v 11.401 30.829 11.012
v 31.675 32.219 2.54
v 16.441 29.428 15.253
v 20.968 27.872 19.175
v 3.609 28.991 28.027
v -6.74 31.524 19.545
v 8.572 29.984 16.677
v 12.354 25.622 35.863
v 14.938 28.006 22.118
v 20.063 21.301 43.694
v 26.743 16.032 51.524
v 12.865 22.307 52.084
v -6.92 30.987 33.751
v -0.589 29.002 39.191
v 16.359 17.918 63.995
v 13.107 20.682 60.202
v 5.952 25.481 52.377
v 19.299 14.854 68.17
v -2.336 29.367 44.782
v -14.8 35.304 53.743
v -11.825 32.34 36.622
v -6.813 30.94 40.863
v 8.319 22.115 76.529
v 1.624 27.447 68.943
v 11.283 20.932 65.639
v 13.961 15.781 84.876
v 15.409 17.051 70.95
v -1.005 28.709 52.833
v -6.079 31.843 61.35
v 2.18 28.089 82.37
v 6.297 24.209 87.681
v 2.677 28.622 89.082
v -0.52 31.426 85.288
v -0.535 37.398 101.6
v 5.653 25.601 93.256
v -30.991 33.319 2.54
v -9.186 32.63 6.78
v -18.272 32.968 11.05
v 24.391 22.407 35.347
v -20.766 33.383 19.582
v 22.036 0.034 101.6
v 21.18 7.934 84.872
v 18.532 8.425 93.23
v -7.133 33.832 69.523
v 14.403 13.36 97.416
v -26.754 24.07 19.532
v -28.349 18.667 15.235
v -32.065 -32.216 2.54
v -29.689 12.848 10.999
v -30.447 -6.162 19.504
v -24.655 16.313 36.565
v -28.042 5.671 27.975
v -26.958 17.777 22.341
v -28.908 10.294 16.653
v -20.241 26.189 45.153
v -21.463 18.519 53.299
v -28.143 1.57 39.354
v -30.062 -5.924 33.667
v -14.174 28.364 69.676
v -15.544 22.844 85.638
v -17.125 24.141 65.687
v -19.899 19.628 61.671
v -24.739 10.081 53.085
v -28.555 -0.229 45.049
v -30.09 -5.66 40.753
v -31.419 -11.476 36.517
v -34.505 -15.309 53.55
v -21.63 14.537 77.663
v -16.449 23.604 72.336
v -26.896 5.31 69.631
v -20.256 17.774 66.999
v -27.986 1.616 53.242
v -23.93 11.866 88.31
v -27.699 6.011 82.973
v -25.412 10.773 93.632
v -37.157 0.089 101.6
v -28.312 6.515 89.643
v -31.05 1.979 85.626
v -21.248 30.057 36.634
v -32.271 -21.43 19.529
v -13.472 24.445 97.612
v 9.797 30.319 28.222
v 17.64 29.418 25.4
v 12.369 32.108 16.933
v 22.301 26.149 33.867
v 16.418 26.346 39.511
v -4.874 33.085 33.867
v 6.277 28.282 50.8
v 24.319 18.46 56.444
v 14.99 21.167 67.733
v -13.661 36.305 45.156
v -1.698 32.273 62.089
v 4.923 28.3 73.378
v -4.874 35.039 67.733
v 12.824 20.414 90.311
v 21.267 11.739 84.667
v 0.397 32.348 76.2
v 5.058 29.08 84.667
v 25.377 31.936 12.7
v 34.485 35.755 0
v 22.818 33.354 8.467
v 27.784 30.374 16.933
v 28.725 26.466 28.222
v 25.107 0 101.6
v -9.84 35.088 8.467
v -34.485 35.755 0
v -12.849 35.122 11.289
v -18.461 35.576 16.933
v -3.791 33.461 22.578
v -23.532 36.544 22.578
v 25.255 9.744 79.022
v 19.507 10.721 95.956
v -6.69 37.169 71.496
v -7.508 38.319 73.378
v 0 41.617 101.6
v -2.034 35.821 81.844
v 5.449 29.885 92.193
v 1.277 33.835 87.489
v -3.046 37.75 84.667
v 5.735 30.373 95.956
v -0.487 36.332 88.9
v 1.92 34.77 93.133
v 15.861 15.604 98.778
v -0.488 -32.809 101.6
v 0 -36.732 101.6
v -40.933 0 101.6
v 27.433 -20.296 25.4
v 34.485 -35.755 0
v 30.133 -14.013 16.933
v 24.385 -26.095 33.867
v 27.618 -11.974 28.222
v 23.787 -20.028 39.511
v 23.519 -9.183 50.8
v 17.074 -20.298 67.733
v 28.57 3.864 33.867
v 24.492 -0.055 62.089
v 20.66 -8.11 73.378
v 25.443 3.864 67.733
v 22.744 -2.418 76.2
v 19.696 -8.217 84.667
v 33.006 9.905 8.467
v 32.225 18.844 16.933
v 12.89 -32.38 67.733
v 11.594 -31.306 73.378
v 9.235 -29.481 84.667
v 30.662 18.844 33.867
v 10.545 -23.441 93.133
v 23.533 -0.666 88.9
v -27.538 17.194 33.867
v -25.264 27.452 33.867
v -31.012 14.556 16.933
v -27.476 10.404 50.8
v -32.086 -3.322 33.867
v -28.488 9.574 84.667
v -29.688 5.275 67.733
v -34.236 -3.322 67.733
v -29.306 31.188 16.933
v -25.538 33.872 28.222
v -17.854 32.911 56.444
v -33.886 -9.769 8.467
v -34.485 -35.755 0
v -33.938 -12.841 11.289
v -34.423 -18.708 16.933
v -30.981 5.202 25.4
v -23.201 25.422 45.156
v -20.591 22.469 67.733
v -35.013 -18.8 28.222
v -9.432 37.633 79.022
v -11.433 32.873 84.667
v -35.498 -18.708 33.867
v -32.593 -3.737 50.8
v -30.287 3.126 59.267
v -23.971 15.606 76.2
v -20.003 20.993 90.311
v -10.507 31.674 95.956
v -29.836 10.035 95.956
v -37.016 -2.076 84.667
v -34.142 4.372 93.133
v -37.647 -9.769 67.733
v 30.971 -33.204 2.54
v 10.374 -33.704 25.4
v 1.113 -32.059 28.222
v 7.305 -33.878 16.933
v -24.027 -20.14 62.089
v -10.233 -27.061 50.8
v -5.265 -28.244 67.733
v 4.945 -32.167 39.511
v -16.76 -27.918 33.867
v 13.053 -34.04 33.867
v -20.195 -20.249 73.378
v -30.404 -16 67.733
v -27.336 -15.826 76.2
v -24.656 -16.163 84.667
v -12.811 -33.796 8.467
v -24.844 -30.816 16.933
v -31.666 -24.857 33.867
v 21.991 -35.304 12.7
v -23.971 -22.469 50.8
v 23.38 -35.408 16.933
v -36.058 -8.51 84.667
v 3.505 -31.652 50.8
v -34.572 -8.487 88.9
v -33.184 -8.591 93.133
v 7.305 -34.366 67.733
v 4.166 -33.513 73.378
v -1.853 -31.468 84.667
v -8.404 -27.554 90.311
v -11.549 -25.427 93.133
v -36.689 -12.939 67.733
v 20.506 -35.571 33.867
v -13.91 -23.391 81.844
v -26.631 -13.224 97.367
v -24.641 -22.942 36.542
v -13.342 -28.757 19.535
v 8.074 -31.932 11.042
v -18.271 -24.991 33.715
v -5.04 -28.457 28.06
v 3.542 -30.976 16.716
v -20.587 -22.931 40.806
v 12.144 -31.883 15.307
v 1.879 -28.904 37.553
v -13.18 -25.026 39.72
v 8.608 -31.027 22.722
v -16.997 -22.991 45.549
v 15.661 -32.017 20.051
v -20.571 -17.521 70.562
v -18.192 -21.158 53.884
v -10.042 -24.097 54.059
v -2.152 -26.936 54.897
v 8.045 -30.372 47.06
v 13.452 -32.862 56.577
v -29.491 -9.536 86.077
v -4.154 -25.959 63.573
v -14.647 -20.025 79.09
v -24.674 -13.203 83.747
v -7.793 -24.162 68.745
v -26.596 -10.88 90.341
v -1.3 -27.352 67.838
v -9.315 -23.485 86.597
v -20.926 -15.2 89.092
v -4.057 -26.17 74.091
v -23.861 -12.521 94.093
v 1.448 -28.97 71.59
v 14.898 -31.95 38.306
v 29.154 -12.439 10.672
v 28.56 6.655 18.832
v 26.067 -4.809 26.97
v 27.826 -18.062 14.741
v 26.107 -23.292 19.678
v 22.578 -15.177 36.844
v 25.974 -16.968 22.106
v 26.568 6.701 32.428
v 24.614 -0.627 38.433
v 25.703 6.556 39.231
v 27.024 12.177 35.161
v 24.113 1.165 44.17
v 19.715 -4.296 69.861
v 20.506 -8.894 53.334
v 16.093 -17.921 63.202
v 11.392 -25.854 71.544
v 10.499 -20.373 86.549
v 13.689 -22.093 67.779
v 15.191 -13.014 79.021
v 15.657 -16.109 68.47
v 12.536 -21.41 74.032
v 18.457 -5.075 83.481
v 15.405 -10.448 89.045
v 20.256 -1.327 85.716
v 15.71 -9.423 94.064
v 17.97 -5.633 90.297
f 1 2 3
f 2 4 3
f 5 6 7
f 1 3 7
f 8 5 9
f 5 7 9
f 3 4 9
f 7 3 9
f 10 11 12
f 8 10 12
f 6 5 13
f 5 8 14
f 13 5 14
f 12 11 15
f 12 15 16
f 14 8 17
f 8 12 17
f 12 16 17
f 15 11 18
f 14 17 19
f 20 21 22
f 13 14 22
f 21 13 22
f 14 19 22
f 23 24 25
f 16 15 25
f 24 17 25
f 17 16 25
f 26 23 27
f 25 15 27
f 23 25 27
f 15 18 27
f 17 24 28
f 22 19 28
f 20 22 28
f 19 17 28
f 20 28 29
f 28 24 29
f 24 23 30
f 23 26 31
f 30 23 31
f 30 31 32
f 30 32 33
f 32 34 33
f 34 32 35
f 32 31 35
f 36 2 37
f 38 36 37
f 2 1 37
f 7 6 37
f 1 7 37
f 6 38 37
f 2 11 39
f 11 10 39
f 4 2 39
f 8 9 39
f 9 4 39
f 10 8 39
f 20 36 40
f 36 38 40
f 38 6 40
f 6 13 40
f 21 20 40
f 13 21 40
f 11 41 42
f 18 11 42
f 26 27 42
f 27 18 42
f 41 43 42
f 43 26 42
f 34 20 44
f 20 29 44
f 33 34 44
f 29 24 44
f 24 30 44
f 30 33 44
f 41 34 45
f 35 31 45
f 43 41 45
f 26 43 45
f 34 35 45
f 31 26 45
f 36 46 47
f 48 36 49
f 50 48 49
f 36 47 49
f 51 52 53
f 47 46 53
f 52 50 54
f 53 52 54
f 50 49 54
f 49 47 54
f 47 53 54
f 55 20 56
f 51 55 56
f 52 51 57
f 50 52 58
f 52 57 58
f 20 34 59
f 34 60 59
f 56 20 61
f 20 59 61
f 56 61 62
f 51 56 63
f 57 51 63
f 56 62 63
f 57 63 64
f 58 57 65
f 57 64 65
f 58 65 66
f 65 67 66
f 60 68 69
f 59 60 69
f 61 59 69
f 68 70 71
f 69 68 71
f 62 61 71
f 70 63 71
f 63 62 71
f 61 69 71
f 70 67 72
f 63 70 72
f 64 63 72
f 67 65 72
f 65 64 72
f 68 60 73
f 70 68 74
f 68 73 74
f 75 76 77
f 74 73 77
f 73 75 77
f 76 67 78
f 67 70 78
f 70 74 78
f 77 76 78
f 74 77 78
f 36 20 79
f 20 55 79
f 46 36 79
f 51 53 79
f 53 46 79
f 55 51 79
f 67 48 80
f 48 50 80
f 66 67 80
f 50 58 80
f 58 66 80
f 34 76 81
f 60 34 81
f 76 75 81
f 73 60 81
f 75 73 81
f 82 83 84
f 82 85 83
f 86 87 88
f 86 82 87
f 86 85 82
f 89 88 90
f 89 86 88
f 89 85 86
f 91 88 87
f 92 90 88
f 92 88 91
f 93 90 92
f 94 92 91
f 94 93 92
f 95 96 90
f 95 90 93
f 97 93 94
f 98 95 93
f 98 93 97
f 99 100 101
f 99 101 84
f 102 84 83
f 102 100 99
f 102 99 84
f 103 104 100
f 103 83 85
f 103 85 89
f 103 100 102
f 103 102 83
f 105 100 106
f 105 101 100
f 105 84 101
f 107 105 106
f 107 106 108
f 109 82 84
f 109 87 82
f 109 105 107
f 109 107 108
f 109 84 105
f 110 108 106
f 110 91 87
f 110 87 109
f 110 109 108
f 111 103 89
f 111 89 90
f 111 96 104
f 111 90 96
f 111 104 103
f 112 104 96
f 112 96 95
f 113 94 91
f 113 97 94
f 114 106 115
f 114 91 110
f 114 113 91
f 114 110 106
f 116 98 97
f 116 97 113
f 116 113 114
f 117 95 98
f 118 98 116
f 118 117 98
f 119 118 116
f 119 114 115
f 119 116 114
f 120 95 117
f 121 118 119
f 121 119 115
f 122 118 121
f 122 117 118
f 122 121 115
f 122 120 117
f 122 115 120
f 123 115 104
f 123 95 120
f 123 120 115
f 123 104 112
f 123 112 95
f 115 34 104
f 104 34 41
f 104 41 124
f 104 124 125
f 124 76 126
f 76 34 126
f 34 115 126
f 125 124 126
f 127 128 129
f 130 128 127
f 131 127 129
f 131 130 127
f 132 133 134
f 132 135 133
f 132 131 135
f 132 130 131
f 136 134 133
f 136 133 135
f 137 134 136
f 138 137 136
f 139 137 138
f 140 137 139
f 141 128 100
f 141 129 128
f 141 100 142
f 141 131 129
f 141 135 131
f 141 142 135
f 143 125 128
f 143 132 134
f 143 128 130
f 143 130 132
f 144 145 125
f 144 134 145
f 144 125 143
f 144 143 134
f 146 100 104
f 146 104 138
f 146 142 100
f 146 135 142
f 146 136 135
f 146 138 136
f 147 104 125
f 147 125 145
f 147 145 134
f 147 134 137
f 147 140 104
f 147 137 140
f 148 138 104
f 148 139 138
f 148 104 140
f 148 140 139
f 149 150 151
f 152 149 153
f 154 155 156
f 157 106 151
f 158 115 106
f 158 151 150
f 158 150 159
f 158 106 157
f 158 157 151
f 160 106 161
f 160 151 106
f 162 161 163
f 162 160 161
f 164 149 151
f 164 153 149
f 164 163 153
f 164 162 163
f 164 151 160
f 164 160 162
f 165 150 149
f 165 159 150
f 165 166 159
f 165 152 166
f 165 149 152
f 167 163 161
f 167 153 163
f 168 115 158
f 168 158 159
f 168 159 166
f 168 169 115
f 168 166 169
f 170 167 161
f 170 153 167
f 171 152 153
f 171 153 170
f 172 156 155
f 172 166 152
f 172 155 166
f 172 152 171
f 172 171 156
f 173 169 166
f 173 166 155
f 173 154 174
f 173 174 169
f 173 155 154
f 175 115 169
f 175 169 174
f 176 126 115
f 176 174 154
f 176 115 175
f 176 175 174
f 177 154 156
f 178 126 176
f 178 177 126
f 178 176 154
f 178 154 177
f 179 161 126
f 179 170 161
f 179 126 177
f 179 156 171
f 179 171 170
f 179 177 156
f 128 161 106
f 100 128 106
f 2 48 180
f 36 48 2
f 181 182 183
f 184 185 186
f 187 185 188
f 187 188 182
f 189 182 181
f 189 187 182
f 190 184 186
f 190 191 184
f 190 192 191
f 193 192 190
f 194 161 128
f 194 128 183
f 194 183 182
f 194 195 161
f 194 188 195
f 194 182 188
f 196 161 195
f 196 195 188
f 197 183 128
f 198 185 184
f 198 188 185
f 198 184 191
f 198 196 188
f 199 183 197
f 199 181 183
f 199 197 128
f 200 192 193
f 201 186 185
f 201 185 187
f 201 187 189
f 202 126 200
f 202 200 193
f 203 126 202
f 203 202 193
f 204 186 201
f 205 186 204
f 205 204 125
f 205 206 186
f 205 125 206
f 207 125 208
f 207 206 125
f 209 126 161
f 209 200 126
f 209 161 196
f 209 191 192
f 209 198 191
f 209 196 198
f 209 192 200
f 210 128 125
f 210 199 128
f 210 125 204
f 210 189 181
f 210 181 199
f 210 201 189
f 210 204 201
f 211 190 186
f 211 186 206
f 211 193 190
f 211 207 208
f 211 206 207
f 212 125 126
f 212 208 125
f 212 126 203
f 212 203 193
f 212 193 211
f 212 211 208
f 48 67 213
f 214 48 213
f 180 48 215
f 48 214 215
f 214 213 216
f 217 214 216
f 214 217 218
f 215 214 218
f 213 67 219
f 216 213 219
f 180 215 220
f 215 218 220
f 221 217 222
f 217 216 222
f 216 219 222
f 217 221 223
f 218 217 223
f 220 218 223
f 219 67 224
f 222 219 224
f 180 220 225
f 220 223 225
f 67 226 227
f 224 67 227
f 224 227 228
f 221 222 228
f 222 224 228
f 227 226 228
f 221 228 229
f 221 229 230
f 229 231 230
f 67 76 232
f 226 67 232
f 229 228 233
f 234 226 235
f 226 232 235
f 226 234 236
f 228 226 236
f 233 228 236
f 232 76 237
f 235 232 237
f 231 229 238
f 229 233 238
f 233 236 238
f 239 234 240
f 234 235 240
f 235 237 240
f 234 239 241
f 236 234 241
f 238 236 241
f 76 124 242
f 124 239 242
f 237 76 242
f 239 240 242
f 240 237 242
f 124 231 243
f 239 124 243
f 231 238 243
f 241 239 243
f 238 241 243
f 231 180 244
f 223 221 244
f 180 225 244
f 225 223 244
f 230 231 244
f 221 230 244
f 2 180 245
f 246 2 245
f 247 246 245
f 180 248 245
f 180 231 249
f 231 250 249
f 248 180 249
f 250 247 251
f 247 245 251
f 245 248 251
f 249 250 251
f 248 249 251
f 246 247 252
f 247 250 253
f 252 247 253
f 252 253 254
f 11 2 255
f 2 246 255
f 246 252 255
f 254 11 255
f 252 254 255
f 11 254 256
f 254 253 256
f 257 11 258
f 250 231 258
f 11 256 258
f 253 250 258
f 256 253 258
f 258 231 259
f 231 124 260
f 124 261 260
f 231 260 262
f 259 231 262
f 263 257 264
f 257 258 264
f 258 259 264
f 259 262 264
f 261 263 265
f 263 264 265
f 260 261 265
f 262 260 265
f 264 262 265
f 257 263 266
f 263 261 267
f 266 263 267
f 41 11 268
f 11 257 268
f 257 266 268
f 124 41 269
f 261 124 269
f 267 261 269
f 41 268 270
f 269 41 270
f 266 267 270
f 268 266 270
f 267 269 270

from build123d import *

# Parameters (mm, degrees)
F0_W = 68.9707696438
F0_H = 71.5107694268
F4_T = -2.54


with BuildPart() as f3:
    # F0 (on Top) → F3 section 0
    with BuildSketch(Plane.XY):
        Rectangle(F0_W, F0_H)
    # F2 (on offset) → F3 section 1
    with BuildSketch(Plane.XY.offset(101.6)):
        Polygon((25.1069236547, 0), (0, 41.6169241071), (-40.9330762923, 0), (0, -36.7323085666), align=None)
    loft()

    # F4
    f4_openings = [f3.faces().sort_by_distance(p)[0] for p in [
        (-5.275384, 1.628205, 101.6),
    ]]
    offset(amount=F4_T, openings=f4_openings, kind=Kind.INTERSECTION)


solid = f3.part
